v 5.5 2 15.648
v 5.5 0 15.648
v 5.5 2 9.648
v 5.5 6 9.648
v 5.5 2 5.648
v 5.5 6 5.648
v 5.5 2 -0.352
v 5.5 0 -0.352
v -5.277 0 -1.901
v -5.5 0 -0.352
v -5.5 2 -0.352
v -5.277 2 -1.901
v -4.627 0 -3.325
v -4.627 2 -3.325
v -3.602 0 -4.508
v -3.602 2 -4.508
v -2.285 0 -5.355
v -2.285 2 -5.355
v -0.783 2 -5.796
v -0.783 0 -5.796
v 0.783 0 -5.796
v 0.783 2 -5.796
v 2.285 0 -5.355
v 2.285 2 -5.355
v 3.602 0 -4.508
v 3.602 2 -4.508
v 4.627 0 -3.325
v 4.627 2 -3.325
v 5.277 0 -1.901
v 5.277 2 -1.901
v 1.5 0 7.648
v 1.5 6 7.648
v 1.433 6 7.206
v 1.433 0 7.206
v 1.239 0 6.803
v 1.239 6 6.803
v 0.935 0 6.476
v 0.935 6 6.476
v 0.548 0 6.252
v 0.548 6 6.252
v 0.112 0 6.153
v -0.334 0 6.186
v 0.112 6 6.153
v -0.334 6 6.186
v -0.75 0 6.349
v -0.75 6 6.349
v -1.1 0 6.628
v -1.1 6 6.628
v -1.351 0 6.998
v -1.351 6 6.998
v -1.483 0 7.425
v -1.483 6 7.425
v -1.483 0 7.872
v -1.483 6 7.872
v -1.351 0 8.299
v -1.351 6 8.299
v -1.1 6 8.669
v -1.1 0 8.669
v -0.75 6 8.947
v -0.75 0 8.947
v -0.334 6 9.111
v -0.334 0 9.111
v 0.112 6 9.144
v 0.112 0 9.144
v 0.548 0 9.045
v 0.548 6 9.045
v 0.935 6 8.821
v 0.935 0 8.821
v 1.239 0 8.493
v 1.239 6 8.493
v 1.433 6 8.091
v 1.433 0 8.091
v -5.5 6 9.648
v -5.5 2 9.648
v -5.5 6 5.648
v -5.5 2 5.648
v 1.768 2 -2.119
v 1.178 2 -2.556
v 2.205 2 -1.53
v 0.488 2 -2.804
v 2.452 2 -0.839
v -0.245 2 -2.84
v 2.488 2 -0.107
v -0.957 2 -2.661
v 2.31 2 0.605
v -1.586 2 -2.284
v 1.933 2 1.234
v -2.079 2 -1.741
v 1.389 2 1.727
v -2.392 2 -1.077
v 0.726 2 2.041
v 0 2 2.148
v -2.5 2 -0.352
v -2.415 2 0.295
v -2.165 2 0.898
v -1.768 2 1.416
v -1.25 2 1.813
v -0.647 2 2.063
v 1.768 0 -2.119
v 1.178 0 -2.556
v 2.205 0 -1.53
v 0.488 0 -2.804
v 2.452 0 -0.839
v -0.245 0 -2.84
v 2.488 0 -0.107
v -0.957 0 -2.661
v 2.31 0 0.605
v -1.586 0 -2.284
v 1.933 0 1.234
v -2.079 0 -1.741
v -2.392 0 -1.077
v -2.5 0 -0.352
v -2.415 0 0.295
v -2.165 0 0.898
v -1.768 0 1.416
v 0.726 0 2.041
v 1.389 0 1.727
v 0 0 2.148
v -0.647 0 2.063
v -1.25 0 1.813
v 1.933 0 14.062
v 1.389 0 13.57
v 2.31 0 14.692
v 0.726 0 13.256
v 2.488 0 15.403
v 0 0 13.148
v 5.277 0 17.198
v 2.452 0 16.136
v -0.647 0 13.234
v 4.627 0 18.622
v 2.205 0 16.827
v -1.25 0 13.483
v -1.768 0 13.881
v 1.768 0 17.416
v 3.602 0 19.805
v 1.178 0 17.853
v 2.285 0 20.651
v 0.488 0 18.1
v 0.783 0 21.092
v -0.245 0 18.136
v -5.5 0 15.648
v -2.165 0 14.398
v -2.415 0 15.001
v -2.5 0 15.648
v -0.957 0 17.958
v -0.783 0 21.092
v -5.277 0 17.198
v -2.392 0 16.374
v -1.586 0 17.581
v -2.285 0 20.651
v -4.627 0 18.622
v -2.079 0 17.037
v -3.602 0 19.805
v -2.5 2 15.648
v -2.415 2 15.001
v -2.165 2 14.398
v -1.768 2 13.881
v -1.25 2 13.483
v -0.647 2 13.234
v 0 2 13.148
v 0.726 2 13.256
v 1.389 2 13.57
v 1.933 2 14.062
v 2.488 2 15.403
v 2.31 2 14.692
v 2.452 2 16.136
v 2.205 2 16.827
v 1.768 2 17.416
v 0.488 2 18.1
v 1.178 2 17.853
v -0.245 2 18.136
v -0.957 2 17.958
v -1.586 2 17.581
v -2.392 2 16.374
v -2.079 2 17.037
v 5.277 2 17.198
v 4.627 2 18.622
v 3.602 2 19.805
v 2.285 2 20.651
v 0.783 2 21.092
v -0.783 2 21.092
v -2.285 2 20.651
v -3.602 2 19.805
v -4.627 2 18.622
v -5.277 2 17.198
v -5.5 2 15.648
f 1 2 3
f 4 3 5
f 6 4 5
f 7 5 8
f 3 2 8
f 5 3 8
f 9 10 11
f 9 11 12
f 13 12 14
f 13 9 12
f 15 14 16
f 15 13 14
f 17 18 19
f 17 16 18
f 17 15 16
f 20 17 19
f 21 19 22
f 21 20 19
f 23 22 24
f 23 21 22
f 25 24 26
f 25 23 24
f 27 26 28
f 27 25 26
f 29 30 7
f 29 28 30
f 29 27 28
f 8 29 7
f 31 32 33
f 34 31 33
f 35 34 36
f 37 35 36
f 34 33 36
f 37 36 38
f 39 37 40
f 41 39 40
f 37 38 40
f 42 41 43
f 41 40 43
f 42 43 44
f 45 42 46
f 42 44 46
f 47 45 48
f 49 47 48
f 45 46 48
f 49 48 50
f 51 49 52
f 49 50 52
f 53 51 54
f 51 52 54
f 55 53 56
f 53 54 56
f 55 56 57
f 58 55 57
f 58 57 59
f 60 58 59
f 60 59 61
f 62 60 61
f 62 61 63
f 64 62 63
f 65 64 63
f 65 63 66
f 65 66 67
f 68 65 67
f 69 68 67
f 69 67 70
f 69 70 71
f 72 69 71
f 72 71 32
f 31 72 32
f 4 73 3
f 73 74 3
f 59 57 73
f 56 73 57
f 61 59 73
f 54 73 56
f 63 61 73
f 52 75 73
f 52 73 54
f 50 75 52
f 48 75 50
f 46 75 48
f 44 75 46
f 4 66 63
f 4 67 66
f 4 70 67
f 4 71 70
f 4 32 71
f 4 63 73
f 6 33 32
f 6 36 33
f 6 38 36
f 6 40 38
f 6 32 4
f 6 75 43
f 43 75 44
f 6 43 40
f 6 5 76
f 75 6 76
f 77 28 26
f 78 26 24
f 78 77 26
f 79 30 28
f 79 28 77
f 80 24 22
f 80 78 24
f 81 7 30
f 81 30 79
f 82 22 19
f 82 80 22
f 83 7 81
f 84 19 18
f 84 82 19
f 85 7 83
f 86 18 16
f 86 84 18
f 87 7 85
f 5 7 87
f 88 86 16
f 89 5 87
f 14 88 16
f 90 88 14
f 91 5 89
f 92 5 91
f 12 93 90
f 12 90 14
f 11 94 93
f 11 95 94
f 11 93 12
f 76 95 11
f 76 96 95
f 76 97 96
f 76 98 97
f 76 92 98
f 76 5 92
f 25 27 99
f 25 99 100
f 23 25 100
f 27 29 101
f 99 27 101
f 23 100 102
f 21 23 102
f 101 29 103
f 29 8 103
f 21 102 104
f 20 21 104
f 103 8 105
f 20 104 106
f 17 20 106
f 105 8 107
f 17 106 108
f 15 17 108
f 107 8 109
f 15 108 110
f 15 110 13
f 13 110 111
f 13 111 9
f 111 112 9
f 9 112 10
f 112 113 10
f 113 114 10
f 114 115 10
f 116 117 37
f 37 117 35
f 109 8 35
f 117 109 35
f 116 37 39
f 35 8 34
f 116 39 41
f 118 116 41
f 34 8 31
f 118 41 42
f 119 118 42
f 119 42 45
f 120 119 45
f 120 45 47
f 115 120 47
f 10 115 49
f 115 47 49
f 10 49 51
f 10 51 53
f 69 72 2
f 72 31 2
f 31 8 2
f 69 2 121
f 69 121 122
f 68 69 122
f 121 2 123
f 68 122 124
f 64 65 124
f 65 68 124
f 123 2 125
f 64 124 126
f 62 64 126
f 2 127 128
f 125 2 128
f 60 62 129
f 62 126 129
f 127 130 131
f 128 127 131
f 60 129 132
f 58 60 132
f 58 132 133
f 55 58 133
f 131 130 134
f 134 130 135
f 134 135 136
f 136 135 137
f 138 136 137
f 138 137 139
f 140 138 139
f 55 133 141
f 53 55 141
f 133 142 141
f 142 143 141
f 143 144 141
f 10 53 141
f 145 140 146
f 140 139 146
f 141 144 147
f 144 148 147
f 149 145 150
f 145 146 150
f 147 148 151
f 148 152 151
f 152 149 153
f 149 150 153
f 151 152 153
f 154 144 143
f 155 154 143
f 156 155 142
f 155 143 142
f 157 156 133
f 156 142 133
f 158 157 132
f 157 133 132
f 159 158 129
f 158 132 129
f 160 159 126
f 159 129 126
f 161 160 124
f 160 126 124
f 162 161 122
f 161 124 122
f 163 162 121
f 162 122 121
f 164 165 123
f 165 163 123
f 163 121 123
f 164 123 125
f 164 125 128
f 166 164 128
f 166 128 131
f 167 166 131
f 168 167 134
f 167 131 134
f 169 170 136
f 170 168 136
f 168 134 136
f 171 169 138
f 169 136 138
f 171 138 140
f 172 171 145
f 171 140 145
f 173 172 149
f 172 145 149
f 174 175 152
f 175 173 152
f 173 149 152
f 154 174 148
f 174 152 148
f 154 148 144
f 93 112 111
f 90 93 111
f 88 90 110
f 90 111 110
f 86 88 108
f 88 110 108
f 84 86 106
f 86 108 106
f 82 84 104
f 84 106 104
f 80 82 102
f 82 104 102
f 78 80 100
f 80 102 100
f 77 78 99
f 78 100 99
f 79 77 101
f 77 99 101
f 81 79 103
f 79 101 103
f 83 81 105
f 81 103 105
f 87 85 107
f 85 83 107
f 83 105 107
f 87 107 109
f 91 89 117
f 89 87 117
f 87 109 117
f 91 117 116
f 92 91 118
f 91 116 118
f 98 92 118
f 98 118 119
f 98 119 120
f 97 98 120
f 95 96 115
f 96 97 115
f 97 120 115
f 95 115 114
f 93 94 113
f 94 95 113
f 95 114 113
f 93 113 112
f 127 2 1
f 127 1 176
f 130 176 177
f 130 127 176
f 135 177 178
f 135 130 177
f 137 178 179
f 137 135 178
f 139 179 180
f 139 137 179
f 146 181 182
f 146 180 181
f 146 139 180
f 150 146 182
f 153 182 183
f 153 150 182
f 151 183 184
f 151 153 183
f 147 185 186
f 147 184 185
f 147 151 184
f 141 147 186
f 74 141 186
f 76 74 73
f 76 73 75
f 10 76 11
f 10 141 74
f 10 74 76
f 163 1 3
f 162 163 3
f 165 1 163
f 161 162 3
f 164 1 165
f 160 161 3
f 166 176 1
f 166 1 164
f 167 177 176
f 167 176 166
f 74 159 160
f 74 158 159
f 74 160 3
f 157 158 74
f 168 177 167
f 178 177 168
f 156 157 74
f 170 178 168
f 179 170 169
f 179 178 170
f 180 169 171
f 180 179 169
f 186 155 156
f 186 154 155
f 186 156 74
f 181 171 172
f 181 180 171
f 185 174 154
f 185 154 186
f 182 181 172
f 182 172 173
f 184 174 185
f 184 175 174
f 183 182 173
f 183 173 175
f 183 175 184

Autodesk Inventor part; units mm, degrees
ref_plane "YZ Plane" through (0, 0, 0) normal (1, 0, 0) x (0, 1, 0)
ref_plane "XZ Plane" through (0, 0, 0) normal (0, 1, 0) x (-1, 0, 0)
ref_plane "XY Plane" through (0, 0, 0) normal (0, 0, 1) x (1, 0, 0)
sketch "Sketch1" plane through (0, 0, 0) normal (0, 1, 0) x (-1, 0, 0)
  circle A0 centre (0, 15.6484) radius 5.5
  line L0 (0, 15.6484) -> (0, -0.3516)
  circle A1 centre (0, -0.3516) radius 5.5
  circle A2 centre (0, 15.6484) radius 2.5
  circle A3 centre (0, -0.3516) radius 2.5
  line L1 (5.5, 15.6484) -> (5.5, -0.3516)
  line L2 (-5.5, 15.6484) -> (-5.5, -0.3516)
  point P0 (0, 0)
  dimension "d0" = 11
  dimension "d1" = 16
  dimension "d2" = 11
  dimension "d3" = 5
  dimension "d4" = 5
extrude "Extrusion1" add sketch "Sketch1" along normal blind 2
sketch "Sketch2" plane through (0, 2, 0) normal (0, 1, 0) x (1, 0, 0)
  circle A0 centre (0, -15.6484) radius 2.5 projected
  line L0 (0, -13.1484) -> (0, -2.1484)
  circle A1 centre (0, 0.3516) radius 2.5 projected
  line L1 (-5.5, 0.3516) -> (-5.5, -15.6484) projected
  line L2 (5.5, -5.6484) -> (-5.5, -5.6484)
  line L3 (-5.5, -5.6484) -> (-5.5, -9.6484)
  line L4 (-5.5, -9.6484) -> (5.5, -9.6484)
  line L5 (5.5, -9.6484) -> (5.5, -5.6484)
  line L6 (5.5, -5.6484) -> (-5.5, -9.6484) construction
  line L7 (-5.5, -5.6484) -> (5.5, -9.6484) construction
  point P0 (0, 0)
  point P1 (0, -7.6484)
  dimension "d7" = 4
extrude "Extrusion2" add sketch "Sketch2" along normal blind 4 contours L4 L1 L2 L0 | L0 L2 L5 L4
sketch "Sketch3" plane through (0, 6, 0) normal (0, 1, 0) x (1, 0, 0)
  line L0 (5.5, -5.6484) -> (-5.5, -5.6484) projected
  line L1 (-5.5, -5.6484) -> (-5.5, -9.6484) projected
  line L2 (-5.5, -9.6484) -> (5.5, -9.6484) projected
  line L3 (5.5, -9.6484) -> (5.5, -5.6484) projected
  circle A0 centre (0, -7.6484) radius 1.5
  point P0 (0, 0)
  point P1 (0, -5.3984)
  dimension "d15" = 3
extrude "Extrusion3" cut sketch "Sketch3" against normal blind 16.6375 contours A0
properties part number "bearing plate"
